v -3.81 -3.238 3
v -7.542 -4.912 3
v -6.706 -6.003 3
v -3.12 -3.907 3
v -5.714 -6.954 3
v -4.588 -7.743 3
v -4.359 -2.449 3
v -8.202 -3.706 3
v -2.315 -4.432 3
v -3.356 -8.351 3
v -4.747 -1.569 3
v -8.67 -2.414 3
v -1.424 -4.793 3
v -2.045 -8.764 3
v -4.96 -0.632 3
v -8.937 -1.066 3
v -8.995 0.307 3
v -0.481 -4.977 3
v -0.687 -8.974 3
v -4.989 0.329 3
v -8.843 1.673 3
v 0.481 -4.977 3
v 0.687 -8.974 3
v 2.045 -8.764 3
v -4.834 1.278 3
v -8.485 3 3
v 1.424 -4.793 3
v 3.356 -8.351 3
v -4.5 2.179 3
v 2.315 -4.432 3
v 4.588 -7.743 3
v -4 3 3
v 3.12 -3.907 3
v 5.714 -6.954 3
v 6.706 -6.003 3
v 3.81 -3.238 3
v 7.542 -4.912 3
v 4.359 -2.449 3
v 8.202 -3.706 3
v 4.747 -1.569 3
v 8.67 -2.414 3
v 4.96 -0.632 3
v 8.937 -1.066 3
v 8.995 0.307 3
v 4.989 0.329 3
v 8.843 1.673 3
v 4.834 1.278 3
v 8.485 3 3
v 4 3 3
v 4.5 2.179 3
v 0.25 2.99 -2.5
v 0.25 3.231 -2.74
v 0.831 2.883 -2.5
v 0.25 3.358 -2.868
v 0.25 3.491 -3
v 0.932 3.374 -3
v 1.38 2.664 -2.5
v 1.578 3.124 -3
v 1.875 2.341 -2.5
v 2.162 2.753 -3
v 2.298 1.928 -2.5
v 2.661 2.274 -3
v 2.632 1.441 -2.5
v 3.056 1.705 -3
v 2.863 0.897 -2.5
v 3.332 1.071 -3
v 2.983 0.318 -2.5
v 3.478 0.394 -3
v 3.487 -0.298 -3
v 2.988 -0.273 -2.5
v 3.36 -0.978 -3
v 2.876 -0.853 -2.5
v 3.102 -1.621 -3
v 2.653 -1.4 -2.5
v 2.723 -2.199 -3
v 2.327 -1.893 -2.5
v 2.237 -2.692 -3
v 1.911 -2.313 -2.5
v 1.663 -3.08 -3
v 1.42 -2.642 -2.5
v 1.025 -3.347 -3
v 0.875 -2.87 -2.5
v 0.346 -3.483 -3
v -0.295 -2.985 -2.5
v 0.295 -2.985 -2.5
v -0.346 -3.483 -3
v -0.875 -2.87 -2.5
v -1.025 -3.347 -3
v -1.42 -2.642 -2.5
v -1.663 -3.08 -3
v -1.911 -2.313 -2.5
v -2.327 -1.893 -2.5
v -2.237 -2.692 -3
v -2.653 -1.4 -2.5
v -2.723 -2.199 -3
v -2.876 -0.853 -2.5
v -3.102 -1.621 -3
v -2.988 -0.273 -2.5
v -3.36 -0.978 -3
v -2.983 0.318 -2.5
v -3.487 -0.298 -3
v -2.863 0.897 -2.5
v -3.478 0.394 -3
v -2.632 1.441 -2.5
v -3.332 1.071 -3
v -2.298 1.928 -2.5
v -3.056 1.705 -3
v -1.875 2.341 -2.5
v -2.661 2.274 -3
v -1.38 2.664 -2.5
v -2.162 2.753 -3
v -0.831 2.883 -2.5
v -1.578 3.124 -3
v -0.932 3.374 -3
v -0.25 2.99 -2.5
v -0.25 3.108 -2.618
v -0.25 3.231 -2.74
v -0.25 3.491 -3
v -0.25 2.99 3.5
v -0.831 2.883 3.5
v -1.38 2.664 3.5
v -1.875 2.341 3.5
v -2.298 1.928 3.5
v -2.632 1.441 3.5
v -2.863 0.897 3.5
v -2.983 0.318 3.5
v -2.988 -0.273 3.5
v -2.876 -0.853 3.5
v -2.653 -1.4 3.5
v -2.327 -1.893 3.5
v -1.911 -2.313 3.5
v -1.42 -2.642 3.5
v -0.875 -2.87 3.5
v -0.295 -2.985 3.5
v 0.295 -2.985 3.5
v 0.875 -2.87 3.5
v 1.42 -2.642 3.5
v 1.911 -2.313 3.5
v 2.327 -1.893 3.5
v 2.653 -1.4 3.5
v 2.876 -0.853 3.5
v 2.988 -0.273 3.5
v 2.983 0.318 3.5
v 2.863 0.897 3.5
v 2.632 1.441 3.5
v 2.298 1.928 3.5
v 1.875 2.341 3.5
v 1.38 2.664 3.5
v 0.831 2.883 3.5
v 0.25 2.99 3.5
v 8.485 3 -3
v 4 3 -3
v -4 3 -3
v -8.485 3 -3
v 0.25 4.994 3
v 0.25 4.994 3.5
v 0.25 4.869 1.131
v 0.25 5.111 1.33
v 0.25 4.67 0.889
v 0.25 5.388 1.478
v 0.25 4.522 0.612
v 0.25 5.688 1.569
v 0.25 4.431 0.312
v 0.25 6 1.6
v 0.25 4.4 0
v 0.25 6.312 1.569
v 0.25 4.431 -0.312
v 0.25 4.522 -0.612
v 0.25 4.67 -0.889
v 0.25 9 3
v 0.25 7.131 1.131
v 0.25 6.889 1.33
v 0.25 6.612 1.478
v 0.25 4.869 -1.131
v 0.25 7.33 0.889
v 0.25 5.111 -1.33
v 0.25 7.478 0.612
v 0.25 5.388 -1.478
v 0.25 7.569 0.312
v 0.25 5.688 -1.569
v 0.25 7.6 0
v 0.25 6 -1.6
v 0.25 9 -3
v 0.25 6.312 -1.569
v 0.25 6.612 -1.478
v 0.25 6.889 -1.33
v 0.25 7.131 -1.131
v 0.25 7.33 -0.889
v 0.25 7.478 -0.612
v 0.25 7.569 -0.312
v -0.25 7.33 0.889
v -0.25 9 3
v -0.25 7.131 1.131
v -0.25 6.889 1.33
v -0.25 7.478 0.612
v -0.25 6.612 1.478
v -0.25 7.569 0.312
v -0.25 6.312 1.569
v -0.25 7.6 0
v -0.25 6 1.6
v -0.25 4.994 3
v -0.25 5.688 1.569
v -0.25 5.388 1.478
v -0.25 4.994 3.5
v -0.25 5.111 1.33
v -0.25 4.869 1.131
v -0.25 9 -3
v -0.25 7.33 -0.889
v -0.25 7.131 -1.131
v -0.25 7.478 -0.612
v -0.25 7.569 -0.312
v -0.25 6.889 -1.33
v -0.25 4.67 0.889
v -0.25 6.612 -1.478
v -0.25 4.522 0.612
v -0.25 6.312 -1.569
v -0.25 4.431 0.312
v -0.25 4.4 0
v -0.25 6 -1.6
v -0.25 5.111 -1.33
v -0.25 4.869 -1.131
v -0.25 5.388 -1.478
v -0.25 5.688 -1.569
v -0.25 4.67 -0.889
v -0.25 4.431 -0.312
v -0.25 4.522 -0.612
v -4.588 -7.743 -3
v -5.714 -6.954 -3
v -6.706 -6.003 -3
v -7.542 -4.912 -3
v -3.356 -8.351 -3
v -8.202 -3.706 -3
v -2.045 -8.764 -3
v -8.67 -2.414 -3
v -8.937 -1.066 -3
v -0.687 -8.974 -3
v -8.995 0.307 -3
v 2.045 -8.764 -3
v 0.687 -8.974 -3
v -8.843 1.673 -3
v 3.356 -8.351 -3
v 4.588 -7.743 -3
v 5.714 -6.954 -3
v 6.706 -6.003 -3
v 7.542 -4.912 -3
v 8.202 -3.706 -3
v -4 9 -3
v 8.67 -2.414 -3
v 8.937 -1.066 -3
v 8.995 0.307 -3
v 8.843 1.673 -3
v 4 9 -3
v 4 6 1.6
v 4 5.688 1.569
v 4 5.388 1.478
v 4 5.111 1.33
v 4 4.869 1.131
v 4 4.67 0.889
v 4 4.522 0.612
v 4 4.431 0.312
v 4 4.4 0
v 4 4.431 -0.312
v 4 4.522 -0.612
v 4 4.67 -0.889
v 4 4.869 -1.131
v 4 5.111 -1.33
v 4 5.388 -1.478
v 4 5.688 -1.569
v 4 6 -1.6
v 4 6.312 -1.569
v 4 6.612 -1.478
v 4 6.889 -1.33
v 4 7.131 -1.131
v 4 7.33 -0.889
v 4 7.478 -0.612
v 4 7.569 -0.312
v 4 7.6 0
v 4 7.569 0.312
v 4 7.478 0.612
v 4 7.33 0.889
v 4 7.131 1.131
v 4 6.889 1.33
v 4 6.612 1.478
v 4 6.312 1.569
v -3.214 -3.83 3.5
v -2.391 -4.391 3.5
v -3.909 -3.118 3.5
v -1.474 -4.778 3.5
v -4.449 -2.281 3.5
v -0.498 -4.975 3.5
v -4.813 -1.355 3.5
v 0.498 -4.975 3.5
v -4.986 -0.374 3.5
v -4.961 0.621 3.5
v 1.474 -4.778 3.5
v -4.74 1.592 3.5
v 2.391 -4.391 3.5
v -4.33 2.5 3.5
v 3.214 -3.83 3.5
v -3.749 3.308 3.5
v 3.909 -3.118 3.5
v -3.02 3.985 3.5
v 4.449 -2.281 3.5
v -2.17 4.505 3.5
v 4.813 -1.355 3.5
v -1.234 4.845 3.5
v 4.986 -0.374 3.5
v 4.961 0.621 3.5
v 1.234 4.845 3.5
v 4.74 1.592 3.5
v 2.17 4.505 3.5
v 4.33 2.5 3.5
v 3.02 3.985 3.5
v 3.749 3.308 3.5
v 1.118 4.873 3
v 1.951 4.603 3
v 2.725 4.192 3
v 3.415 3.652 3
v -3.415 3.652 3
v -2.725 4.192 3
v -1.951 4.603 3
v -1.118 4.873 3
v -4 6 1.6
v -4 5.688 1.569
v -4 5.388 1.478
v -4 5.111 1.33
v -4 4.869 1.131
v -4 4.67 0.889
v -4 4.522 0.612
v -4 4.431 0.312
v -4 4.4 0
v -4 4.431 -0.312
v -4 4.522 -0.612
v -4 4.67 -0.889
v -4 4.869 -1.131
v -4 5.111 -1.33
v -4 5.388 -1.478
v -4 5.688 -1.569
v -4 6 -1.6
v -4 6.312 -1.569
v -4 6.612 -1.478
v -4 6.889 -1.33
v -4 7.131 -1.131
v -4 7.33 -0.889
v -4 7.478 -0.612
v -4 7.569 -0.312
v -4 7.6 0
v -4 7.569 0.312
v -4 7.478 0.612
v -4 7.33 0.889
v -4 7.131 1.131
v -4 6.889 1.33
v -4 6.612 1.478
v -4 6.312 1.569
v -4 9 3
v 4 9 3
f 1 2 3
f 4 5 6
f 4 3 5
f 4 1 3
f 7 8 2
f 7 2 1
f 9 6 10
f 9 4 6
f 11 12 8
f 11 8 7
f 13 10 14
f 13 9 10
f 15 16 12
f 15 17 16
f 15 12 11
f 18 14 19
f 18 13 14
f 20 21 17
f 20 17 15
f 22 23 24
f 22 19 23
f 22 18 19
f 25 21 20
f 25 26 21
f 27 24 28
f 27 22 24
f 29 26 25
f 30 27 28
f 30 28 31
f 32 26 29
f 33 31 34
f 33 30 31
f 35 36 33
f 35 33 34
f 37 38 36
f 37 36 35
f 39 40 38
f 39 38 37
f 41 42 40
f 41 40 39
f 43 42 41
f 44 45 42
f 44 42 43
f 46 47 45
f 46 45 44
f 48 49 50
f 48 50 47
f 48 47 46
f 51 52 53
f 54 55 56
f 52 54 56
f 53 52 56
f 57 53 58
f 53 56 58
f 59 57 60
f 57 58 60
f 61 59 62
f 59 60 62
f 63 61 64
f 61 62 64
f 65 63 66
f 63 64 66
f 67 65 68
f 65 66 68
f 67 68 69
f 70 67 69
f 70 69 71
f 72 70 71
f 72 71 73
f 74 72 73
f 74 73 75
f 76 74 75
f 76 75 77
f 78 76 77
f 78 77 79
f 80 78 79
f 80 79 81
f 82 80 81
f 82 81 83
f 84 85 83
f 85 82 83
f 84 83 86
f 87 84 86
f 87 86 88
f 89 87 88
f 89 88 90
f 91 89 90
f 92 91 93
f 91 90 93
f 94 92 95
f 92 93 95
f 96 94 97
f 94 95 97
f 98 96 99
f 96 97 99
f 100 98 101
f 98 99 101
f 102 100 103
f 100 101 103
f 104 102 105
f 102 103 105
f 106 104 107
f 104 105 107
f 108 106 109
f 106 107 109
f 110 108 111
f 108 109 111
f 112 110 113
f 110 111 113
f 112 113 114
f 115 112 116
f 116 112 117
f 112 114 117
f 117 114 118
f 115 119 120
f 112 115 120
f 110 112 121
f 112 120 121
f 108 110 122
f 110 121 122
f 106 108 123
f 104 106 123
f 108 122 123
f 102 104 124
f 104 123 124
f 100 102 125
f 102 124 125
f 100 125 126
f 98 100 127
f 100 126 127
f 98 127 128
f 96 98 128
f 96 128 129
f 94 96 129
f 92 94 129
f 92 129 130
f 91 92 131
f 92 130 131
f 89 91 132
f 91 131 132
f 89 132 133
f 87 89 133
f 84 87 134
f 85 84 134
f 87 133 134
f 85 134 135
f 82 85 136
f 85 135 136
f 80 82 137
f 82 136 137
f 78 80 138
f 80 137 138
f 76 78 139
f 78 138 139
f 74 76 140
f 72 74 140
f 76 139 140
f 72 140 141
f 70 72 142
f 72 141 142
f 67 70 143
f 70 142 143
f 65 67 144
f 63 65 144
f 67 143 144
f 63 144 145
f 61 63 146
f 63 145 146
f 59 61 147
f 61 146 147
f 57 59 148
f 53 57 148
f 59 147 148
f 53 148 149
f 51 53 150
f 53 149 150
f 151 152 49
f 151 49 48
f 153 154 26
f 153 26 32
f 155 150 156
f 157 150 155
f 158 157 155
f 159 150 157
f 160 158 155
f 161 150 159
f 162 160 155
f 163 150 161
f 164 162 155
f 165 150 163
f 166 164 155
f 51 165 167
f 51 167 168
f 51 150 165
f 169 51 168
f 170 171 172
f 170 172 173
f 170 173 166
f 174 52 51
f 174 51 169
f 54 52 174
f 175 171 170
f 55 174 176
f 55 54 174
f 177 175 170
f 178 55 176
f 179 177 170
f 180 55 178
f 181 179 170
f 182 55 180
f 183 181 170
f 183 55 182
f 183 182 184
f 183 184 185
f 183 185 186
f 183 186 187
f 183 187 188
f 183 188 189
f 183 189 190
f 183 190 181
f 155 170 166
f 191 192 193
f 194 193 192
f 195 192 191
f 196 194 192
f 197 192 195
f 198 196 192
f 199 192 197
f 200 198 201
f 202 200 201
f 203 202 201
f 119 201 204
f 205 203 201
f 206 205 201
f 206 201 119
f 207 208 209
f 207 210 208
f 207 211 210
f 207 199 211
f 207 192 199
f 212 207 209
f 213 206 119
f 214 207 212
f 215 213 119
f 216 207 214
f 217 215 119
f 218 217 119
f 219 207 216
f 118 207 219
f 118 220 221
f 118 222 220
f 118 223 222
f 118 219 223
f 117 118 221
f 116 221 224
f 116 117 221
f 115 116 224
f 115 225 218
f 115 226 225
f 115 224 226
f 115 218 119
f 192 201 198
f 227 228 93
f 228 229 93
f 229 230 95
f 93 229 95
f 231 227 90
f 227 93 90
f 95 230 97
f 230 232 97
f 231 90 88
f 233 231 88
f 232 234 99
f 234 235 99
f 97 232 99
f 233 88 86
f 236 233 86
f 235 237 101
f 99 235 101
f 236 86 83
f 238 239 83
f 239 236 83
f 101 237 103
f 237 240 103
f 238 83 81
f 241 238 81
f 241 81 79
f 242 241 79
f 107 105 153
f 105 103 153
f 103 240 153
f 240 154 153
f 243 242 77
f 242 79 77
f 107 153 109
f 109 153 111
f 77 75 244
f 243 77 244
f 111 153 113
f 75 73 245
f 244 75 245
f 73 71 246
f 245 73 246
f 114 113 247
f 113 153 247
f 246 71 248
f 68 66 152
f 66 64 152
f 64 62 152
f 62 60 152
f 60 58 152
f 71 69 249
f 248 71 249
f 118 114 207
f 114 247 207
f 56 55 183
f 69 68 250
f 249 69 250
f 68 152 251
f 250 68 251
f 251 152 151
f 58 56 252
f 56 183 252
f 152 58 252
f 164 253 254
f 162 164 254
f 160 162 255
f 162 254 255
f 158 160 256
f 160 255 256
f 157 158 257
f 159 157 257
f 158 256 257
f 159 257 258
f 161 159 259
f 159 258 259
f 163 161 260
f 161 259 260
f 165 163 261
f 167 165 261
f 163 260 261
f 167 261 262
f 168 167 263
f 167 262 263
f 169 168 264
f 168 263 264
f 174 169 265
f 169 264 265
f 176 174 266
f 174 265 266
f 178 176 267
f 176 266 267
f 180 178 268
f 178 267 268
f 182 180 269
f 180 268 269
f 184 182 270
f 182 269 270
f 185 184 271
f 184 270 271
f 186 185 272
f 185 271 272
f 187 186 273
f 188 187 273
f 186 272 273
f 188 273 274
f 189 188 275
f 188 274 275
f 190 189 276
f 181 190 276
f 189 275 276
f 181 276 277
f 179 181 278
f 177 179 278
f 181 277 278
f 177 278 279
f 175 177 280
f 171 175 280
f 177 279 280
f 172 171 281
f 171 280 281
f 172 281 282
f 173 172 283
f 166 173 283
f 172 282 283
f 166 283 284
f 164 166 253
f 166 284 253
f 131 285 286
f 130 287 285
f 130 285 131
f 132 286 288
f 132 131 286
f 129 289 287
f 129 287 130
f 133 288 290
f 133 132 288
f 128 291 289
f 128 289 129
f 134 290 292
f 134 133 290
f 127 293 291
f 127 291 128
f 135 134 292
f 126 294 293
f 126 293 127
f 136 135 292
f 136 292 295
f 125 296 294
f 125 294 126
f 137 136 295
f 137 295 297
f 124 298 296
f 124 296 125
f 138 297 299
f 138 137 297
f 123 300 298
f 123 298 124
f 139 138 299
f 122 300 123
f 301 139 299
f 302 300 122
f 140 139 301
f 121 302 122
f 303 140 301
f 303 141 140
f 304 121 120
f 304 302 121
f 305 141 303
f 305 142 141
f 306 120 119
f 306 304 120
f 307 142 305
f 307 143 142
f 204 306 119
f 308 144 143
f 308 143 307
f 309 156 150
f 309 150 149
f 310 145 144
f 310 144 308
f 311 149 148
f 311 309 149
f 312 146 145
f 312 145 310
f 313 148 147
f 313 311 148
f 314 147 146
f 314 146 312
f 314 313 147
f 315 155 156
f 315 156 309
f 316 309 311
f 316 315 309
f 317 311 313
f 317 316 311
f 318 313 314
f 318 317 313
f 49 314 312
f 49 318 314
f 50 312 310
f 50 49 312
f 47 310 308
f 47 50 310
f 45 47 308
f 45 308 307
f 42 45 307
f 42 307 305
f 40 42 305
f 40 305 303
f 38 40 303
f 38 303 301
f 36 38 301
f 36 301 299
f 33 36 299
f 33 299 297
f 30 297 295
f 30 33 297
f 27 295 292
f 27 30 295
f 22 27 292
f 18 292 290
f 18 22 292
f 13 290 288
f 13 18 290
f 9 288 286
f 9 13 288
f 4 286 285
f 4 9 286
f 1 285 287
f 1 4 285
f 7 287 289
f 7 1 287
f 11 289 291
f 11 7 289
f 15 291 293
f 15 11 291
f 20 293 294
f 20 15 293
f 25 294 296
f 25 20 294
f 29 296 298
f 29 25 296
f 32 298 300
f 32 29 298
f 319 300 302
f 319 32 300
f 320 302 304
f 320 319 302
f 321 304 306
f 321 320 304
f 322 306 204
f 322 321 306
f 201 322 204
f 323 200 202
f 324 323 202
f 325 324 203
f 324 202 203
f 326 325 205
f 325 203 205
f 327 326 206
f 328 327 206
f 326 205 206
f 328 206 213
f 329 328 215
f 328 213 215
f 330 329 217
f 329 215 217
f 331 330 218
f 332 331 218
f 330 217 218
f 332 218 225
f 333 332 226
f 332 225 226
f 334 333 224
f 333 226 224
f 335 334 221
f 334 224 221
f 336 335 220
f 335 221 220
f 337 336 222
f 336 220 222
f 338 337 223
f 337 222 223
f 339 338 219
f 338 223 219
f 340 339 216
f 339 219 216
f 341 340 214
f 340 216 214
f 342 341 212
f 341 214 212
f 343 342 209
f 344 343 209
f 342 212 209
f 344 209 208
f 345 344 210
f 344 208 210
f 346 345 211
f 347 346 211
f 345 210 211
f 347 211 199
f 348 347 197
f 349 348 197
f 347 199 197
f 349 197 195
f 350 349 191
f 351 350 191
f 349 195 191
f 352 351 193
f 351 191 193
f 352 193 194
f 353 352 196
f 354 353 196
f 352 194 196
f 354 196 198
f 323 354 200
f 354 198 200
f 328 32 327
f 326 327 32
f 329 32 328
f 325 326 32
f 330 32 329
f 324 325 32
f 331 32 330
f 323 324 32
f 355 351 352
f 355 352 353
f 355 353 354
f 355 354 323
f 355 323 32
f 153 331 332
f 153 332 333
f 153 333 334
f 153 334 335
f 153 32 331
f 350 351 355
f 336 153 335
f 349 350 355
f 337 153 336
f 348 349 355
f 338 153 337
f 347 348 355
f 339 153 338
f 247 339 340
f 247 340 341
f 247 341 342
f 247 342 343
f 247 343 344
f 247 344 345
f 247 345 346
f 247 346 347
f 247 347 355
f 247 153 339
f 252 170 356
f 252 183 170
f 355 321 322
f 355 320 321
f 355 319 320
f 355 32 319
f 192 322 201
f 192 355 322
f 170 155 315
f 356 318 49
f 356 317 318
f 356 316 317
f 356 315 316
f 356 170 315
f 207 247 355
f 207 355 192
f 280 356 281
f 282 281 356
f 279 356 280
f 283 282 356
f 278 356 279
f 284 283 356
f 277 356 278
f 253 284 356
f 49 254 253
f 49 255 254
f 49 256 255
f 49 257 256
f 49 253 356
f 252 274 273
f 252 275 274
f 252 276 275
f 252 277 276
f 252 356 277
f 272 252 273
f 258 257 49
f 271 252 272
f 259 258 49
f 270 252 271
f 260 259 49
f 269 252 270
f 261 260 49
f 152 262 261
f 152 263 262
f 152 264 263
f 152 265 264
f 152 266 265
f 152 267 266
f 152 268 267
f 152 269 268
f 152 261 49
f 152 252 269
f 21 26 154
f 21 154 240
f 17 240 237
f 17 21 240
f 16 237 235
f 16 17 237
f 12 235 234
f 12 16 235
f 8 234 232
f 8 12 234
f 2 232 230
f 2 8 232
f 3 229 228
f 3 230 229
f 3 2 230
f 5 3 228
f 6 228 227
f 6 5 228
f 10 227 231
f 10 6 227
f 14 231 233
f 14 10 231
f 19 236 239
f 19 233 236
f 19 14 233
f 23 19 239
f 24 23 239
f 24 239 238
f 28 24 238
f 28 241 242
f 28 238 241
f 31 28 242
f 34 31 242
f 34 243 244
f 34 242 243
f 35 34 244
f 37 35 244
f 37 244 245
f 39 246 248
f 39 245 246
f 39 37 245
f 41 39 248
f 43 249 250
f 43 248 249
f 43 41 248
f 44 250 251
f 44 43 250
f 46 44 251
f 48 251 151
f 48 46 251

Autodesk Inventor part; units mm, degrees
ref_plane "XZ Plane" through (0, 0, 0) normal (0, 1, 0) x (-1, 0, 0)
ref_plane "XY Plane" through (0, 0, 0) normal (0, 0, 1) x (1, 0, 0)
sketch "スケッチ1" plane through (0, 0, 0) normal (0, 0, 1) x (1, 0, 0)
  circle A0 centre (0, 0) radius 3
  circle A1 centre (0, 0) radius 9
  dimension "d0" = 6
  dimension "d1" = 18
extrude "押し出し1" add sketch "スケッチ1" along normal mid plane 6
ref_plane "作業平面1" through (-9, 0, 0) normal (1, 0, 0) x (0, 1, 0)
sketch "スケッチ5" plane through (0, 0, 3) normal (0, 0, 1) x (1, 0, 0)
  arc A0 (3, 0) -> (3, 0) centre (0, 0) ccw projected
  circle A1 centre (0, 0) radius 5
  circle A2 centre (0, 0) radius 3 projected
  circle A3 centre (0, 0) radius 3 projected
  dimension "d33" = 10
extrude "押し出し3" add sketch "スケッチ5" along normal blind 0.5
chamfer "面取り3" distance 0.5 angle 45 1 edges at (-3, 0, -3)
sketch "スケッチ10" plane through (0, 0, -3) normal (0, 0, -1) x (-1, 0, 0)
  circle A0 centre (0, 0) radius 9 projected
  line L0 (-9, 9) -> (-4, 9)
  line L1 (-4, 9) -> (-4, 3)
  line L2 (-4, 3) -> (-9, 3)
  line L3 (-9, 3) -> (-9, 9)
  point P0 (-8.4853, 3)
  point P1 (-4, 8.0623)
  dimension "d48" = 4
  dimension "d49" = 6
extrude "押し出し7" cut sketch "スケッチ10" against normal blind 10 contours L1 L2 A0 picked at (-4.4898, 6.0699)
mirror "ミラー4" about plane through (0, 0, 0) normal (1, 0, 0) of "押し出し7"
sketch "スケッチ11" plane through (-4, 3, 3) normal (-1, 0, 0) x (0, 0, 1)
  line L0 (-7.3, -3) -> (1.8, -3) projected
  line L1 (-6, 0) -> (-6, 5.0623) projected
  point P0 (-3, -3)
  point P1 (-3, 3)
  dimension "d52" = 6
  dimension "d53" = 3
hole "穴3" at (-4, 6, 0) direction (1, 0, 0) diameter 3.2 end through all clearance for "Socket Head Cap Screw" size "M3" standard "Ansi Metric M Profile"
sketch "スケッチ12" plane through (0, 0, -3) normal (0, 0, -1) x (-1, 0, 0)
  line L0 (-4, 8.0623) -> (4, 8.0623)
  line L1 (4, 8.0623) -> (4, 9)
  line L2 (4, 9) -> (-4, 9)
  line L3 (-4, 9) -> (-4, 8.0623)
  arc A0 (4, 8.0623) -> (-4, 8.0623) centre (0, 0) ccw projected
  point P0 (0, 9)
extrude "押し出し8" add sketch "スケッチ12" against normal up to surface (6 mm away) contours L3 L2 A0 | A0 L2 L1
sketch "スケッチ13" plane through (0, 0, -3) normal (0, 0, -1) x (-1, 0, 0)
  line L0 (-0.25, 9) -> (0.25, 9)
  line L1 (0.25, 9) -> (0.25, 2.9896)
  line L2 (0.25, 2.9896) -> (-0.25, 2.9896)
  line L3 (-0.25, 2.9896) -> (-0.25, 9)
  line L4 (-0.25, 9) -> (0.25, 2.9896) construction
  line L5 (0.25, 9) -> (-0.25, 2.9896) construction
  line L6 (4, 9) -> (-4, 9) projected
  circle A0 centre (0, 0) radius 3 projected
  point P0 (0, 5.9948)
  point P1 (0, 5.9948)
  dimension "d63" = 0.5
extrude "押し出し9" cut sketch "スケッチ13" against normal blind 10 contours L0 L1 A0 L3
properties part number "shooter_base7" material "ABS プラスチック"
